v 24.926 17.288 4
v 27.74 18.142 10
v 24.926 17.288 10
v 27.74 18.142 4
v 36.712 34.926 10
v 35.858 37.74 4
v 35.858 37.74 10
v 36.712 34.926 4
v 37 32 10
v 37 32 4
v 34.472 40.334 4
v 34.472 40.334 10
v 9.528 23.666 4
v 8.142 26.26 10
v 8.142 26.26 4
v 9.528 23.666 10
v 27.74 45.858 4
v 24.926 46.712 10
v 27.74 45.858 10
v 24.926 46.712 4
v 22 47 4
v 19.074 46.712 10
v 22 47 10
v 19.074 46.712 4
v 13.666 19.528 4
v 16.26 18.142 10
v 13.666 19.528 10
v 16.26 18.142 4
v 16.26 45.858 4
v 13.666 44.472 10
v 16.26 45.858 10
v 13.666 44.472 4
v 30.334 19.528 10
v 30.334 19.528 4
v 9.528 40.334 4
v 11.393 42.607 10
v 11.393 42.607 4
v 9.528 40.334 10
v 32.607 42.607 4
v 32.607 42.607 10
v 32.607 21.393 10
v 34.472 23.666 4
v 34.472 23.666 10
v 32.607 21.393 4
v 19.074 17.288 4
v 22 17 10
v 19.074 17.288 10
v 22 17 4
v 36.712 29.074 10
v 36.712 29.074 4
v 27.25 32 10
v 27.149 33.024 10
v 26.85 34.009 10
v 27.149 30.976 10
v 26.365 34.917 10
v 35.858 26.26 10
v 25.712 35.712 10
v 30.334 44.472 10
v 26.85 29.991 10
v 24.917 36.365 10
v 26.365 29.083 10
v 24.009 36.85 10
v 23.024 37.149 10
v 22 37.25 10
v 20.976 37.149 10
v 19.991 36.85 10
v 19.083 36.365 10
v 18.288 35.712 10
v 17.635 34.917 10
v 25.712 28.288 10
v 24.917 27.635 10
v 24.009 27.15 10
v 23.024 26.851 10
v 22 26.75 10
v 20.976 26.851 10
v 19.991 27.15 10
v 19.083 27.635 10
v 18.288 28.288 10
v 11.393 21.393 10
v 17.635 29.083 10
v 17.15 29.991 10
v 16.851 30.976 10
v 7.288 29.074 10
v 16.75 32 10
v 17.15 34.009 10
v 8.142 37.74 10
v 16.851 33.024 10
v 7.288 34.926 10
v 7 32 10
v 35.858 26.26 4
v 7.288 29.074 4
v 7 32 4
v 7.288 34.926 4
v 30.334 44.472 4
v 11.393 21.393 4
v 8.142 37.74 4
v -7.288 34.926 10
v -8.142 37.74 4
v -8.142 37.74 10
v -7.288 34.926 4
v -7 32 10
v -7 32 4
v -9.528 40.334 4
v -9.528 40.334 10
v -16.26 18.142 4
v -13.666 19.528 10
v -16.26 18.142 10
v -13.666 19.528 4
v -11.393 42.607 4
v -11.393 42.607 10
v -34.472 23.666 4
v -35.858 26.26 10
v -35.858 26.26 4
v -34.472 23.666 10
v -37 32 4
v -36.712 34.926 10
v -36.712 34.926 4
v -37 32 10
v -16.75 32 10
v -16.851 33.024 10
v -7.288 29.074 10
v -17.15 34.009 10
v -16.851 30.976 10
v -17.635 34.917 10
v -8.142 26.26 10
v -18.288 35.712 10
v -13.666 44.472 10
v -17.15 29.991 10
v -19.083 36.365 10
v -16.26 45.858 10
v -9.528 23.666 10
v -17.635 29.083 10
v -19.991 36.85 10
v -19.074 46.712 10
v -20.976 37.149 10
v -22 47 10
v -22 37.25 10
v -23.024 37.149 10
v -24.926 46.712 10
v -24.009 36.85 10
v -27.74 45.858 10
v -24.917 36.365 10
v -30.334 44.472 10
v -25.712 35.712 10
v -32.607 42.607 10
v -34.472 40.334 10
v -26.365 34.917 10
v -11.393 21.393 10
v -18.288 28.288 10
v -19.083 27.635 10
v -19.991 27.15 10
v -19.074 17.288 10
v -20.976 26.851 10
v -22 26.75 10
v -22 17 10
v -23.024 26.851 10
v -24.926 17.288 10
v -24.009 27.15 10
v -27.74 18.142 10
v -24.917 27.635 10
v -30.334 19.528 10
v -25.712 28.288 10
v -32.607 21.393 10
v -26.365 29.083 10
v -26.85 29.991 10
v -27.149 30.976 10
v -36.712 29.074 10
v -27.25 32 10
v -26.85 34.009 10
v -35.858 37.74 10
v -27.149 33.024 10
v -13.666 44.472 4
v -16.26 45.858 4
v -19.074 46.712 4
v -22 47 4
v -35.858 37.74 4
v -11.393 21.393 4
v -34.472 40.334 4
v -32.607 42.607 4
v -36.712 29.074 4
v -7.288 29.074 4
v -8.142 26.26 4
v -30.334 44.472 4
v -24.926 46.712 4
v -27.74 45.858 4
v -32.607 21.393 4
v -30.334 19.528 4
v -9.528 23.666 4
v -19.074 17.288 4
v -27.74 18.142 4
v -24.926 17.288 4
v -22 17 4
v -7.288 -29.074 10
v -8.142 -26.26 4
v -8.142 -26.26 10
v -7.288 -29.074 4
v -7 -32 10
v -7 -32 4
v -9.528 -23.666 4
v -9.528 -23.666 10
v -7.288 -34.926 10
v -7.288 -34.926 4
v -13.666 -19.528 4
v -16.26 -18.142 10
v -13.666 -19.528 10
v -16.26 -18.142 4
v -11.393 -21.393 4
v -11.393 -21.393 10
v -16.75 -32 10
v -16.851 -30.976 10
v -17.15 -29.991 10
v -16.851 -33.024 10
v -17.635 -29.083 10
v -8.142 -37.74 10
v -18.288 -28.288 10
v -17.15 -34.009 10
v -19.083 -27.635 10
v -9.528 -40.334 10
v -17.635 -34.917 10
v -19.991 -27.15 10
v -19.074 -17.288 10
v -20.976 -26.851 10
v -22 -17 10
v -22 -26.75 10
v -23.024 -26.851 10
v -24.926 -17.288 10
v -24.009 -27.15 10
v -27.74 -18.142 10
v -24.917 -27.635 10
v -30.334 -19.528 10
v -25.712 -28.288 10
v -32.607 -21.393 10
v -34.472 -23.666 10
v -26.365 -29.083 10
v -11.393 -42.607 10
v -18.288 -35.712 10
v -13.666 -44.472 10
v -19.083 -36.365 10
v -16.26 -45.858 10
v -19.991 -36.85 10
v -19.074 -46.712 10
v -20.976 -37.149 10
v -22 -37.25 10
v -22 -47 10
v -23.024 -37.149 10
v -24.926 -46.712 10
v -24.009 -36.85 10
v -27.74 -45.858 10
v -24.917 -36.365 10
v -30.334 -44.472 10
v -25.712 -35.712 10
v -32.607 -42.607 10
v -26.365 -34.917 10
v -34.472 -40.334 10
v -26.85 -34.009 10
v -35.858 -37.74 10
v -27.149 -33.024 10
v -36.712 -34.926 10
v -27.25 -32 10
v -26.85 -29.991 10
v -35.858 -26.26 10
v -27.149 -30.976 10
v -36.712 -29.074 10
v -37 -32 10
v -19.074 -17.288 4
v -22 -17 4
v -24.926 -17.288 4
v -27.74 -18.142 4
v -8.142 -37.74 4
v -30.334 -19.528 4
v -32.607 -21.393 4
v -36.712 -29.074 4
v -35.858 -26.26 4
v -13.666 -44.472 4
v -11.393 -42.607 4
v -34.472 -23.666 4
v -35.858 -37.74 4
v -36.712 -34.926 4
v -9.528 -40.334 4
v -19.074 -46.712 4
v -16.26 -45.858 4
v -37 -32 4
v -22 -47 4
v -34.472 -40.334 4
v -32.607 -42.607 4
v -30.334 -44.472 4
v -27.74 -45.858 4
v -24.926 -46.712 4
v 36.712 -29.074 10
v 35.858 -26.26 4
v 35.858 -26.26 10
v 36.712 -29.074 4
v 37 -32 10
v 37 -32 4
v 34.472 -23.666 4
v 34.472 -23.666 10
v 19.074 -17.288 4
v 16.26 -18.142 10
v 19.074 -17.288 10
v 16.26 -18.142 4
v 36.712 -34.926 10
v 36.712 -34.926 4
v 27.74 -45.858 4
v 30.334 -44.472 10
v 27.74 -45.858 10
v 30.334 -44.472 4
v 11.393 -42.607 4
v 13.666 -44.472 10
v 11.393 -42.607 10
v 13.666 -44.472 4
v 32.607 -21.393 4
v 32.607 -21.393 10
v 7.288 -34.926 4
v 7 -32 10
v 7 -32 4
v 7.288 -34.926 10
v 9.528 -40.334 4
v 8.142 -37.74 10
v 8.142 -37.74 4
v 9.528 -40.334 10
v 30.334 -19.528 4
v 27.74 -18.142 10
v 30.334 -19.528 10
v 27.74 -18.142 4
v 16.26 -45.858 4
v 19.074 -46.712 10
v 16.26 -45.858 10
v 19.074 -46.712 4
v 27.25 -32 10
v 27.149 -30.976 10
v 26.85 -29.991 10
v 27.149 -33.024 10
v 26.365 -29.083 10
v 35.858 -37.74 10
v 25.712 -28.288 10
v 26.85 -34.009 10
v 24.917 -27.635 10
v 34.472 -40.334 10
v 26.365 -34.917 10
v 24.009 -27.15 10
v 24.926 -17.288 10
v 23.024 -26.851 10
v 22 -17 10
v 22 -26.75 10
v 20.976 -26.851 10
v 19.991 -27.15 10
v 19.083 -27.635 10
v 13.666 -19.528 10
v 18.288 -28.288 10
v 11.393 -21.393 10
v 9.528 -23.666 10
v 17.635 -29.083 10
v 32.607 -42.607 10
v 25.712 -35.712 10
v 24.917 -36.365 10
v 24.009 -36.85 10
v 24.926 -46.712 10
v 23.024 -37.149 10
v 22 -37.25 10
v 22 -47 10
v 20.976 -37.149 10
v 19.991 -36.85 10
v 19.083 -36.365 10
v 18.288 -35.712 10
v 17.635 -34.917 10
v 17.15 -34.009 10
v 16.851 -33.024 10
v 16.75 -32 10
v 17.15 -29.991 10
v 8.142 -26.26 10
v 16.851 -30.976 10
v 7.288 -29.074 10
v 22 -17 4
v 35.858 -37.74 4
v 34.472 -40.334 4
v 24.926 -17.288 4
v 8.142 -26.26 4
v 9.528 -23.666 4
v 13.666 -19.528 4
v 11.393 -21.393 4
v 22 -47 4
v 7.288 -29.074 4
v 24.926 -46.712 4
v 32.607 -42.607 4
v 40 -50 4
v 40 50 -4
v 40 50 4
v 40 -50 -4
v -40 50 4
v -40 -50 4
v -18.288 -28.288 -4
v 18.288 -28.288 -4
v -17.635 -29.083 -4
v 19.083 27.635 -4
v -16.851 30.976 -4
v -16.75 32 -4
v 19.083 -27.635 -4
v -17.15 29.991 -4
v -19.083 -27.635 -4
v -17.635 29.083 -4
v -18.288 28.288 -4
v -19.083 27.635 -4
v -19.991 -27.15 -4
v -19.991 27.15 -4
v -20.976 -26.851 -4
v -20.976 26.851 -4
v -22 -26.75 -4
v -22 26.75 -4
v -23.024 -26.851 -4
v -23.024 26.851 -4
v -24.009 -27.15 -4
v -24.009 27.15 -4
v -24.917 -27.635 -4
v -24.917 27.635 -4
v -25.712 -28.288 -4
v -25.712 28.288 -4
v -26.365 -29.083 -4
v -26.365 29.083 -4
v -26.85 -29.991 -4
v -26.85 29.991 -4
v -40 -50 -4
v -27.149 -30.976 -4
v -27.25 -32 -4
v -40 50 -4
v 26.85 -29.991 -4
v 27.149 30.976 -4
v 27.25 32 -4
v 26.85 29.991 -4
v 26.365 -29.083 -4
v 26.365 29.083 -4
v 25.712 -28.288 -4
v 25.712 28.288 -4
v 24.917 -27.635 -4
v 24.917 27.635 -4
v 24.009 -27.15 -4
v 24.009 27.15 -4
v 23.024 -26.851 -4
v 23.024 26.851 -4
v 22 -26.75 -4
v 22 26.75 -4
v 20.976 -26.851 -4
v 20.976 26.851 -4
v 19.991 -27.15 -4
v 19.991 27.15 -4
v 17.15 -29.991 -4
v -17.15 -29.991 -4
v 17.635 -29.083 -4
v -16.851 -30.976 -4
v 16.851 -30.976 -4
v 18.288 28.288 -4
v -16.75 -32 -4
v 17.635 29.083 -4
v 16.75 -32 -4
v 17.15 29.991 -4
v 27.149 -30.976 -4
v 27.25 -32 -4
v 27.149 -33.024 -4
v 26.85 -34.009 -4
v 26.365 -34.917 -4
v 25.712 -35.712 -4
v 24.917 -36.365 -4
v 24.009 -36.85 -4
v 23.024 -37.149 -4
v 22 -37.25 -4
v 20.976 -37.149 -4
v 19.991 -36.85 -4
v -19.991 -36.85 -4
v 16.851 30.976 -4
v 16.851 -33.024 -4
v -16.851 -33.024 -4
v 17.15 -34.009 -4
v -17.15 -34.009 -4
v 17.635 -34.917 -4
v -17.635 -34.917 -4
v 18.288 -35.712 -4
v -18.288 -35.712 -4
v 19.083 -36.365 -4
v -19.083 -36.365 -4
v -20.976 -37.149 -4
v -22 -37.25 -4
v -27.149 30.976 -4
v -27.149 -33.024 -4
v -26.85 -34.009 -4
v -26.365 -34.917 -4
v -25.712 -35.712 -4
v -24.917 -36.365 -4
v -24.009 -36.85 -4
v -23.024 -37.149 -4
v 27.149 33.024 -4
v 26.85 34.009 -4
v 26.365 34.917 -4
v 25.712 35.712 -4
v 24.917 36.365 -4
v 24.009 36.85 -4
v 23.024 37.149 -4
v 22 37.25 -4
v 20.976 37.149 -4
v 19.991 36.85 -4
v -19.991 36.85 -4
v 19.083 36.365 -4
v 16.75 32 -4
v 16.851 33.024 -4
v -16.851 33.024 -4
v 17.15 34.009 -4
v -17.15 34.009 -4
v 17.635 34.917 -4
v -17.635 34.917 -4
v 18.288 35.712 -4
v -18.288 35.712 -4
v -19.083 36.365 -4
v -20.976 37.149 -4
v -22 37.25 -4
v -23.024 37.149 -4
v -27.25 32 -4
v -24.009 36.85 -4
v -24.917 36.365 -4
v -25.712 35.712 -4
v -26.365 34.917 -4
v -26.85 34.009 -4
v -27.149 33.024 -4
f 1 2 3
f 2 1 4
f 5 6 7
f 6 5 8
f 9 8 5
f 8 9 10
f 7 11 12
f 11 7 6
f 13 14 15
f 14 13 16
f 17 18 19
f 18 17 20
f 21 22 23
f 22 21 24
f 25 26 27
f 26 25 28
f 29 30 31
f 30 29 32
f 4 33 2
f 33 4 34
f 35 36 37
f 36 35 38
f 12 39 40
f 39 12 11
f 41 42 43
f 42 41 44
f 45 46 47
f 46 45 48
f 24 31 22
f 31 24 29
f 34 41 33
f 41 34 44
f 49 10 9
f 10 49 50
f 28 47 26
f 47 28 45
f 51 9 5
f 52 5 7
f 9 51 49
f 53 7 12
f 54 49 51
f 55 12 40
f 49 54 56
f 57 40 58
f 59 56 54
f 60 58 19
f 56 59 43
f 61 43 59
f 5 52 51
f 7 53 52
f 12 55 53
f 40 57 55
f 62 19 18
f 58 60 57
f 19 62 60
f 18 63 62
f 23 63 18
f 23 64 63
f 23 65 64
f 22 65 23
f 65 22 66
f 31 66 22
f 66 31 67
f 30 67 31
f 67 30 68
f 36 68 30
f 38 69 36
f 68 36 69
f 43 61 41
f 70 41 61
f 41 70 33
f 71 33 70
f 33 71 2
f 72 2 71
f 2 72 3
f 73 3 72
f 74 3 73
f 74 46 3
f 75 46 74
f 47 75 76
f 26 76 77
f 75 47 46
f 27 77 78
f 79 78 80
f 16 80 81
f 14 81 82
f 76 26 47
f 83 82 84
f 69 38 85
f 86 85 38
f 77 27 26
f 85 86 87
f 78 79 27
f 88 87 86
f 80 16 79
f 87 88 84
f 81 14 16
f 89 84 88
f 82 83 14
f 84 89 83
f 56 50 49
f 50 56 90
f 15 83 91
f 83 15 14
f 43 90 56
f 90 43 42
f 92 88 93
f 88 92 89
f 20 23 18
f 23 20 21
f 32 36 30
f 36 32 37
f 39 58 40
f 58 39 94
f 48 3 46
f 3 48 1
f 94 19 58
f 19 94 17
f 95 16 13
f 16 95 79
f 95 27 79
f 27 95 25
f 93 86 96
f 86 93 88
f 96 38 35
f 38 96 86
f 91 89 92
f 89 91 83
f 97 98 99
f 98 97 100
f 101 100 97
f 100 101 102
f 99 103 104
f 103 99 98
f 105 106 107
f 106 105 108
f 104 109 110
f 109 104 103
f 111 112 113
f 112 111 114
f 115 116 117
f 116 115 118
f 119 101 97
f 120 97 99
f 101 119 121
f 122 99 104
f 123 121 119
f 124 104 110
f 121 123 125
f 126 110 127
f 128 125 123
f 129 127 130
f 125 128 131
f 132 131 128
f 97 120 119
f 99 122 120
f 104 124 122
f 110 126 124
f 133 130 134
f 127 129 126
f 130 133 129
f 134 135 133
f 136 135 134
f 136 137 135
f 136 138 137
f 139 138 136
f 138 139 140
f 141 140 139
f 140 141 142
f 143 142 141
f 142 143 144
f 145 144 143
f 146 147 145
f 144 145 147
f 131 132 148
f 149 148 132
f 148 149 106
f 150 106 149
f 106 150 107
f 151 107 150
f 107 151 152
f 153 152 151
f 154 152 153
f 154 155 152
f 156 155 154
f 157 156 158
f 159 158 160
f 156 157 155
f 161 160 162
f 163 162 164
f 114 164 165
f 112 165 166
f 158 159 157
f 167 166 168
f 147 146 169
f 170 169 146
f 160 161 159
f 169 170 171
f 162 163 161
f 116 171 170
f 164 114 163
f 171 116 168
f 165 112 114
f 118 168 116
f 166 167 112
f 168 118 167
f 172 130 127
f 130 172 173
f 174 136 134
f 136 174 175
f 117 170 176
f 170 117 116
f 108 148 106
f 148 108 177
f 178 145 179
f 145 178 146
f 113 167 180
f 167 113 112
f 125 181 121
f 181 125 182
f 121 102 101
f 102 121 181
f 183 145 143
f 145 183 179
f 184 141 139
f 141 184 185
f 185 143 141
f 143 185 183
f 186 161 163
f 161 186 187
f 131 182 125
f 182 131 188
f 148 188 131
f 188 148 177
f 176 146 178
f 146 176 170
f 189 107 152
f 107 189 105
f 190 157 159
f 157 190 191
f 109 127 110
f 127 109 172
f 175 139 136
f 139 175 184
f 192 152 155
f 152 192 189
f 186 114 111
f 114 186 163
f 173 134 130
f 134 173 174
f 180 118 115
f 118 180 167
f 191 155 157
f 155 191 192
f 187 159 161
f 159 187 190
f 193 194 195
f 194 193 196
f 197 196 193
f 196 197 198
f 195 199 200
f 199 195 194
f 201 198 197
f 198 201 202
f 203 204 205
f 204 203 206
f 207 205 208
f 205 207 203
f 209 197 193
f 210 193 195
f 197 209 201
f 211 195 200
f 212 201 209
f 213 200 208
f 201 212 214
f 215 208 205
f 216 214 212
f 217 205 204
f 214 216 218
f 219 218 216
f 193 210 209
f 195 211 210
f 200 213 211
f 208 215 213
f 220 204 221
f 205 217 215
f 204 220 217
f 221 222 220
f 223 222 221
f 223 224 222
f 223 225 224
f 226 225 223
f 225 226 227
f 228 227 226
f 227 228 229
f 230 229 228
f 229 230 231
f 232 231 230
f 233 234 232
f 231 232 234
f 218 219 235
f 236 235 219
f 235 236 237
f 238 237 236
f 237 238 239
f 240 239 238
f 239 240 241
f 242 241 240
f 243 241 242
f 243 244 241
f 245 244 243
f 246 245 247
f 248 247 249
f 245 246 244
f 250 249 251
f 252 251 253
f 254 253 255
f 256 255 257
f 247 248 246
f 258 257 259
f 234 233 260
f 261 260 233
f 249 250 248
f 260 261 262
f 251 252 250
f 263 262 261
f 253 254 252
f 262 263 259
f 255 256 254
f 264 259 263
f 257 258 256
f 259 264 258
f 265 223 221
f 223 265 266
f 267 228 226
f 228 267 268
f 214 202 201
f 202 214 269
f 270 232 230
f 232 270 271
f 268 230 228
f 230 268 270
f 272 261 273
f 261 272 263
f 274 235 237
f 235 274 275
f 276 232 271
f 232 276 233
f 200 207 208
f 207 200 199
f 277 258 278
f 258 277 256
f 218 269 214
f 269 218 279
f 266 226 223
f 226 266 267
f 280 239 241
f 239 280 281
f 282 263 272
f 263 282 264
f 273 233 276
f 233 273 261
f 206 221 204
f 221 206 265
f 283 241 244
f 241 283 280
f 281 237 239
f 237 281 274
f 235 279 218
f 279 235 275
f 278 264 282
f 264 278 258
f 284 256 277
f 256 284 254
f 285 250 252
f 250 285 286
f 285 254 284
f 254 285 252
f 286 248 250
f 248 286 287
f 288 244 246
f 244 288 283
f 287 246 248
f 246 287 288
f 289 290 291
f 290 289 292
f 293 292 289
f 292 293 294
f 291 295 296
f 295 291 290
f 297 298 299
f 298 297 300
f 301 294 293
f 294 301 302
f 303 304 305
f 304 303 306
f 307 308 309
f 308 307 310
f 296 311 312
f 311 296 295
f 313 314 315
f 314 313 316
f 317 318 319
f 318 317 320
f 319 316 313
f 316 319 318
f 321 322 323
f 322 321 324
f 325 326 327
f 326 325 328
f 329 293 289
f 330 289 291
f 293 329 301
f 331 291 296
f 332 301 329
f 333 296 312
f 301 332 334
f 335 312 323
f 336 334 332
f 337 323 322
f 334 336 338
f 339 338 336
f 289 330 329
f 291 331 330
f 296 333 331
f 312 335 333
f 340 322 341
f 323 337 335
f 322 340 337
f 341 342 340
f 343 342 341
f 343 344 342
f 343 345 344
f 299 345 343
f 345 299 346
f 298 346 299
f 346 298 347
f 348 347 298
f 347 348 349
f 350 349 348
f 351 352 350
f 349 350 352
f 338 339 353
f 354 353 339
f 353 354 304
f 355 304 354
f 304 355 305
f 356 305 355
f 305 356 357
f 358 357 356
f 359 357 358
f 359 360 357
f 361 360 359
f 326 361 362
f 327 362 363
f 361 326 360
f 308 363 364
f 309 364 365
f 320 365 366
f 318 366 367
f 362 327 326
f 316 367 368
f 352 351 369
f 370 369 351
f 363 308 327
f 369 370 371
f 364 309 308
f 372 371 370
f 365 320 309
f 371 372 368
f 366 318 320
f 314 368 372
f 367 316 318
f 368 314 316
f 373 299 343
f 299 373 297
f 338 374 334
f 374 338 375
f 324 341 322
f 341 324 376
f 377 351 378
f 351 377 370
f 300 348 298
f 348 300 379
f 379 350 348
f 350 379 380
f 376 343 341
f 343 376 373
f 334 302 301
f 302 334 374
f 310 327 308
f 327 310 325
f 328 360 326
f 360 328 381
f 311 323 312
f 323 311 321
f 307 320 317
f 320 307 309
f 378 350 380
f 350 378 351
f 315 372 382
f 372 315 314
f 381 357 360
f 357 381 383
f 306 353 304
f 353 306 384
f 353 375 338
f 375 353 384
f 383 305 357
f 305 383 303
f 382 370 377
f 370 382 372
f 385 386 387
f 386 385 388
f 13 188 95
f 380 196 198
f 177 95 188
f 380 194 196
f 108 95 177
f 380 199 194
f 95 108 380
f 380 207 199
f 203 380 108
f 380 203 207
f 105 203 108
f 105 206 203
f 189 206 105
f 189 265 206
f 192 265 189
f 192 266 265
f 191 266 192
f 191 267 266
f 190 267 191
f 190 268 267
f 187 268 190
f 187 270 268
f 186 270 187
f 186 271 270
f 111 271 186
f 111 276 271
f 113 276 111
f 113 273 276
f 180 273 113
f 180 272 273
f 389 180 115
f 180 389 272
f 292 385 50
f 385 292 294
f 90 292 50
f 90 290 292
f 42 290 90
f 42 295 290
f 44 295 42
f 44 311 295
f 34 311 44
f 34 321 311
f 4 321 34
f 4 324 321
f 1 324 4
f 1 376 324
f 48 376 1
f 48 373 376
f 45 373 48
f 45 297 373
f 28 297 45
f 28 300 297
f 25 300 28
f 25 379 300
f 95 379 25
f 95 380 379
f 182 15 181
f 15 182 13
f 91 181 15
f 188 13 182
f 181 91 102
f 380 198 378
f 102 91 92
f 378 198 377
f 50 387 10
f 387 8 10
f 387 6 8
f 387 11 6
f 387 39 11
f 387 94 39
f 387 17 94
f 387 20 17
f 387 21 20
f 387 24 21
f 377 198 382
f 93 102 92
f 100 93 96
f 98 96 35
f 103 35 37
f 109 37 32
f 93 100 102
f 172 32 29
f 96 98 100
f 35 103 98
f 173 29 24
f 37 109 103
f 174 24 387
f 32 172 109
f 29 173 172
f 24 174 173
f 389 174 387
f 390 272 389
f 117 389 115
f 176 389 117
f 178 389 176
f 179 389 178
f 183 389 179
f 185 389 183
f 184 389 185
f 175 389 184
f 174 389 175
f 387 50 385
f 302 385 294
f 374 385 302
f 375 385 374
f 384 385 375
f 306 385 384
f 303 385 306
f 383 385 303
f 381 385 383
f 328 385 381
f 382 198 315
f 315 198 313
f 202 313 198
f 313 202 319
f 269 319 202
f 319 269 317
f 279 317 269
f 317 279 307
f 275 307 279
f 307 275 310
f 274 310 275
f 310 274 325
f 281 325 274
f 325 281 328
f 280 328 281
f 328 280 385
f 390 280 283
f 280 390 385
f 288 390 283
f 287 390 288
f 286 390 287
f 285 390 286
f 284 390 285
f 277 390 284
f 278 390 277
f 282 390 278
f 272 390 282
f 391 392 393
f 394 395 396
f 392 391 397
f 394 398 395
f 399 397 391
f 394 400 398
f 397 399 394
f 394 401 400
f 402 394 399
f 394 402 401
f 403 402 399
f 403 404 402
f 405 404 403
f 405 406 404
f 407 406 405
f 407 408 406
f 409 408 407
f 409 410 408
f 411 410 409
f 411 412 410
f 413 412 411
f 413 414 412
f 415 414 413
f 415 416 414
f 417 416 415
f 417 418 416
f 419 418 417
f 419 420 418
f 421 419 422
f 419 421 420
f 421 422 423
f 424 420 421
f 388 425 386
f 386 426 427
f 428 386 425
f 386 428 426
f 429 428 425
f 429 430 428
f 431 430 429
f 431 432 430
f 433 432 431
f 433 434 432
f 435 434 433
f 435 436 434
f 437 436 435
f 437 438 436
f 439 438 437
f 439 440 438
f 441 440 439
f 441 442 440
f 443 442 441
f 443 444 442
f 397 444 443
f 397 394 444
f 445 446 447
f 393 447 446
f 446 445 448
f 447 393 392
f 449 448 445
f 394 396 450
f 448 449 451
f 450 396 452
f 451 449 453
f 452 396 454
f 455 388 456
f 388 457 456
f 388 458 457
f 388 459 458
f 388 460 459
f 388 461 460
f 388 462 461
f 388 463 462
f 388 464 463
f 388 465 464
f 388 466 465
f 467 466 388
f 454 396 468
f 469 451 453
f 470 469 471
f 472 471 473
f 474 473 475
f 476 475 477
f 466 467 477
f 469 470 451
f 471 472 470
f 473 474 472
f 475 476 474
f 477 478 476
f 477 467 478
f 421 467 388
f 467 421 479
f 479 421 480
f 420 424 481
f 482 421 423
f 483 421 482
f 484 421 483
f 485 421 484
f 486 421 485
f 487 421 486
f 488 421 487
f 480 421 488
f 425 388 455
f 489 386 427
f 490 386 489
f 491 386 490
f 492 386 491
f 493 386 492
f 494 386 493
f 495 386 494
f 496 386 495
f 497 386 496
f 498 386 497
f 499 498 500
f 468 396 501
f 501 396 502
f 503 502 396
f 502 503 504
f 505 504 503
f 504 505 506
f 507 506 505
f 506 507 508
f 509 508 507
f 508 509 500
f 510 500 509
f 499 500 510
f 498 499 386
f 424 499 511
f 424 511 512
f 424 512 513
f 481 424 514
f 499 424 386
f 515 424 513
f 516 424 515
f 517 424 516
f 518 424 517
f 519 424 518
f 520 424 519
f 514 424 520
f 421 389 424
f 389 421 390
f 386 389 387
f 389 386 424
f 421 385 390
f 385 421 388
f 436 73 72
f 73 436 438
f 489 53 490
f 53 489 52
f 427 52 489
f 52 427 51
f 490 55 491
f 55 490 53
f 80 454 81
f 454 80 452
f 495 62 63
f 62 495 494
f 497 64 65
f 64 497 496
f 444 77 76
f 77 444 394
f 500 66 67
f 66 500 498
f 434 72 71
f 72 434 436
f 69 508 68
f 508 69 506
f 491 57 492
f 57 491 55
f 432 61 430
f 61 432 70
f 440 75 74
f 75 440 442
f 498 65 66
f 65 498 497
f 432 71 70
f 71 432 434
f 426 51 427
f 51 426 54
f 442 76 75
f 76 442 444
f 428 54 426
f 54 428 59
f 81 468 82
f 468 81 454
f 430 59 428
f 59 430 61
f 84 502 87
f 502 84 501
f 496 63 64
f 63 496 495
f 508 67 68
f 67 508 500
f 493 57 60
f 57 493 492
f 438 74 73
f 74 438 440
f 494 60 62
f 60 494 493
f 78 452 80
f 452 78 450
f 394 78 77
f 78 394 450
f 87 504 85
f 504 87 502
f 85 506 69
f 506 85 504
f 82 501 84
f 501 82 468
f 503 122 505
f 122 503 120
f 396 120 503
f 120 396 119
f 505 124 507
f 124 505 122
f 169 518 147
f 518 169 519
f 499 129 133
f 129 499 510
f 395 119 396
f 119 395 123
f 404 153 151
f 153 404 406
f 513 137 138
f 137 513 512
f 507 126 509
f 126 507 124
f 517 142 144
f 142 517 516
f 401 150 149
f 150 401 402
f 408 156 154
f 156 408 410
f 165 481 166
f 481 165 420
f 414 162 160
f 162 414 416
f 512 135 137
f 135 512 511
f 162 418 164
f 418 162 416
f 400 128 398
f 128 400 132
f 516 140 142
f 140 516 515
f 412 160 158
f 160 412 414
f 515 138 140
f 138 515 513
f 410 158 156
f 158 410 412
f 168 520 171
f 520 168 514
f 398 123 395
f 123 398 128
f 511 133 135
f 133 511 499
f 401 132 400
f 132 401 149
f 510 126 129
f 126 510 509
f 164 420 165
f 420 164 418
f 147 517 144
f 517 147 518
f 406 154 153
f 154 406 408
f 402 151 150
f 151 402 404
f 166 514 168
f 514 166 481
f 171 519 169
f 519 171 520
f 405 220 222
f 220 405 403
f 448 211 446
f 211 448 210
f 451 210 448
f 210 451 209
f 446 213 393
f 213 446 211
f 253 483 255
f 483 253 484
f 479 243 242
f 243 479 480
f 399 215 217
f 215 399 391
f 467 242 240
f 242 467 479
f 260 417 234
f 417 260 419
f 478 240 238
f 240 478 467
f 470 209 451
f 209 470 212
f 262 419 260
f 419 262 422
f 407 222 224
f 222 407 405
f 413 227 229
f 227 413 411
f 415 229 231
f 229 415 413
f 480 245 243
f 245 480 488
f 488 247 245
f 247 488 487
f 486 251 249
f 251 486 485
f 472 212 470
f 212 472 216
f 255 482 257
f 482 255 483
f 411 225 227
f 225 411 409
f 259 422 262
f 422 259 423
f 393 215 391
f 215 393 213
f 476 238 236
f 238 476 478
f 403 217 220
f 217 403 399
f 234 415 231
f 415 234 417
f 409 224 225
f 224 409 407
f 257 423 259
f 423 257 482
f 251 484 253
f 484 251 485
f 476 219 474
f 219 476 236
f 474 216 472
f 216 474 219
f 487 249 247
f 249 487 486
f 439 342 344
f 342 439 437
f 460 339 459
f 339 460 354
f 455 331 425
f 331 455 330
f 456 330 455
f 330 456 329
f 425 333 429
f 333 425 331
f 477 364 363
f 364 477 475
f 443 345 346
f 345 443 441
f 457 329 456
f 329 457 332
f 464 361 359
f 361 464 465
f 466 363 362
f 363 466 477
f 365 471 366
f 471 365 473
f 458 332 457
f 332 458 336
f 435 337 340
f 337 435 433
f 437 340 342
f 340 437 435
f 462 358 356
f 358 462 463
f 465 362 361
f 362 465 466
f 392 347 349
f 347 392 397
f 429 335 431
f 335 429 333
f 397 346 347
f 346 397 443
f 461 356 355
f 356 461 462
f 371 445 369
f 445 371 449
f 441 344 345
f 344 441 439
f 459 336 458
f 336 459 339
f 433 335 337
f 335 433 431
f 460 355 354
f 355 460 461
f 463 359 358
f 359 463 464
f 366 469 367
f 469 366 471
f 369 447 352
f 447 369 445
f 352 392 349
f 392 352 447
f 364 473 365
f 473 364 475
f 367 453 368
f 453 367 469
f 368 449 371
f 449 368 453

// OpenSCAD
$fn = 32;

// ----------------------------------------------------------------------
// Anchor pads 80 x 100 x 14
// four corner bosses with anchor holes
// ----------------------------------------------------------------------

// --- parameters (mm) ---
plate = [80, 100, 8];  // base plate size (x, y, z)
pads = 4;              // boss count, one per corner
edge = 18;             // boss centre offset from the plate edge
boss_d = 30;           // boss diameter
boss_h = 6;            // boss height above the base plate
hole_d = 10.5;         // hole diameter

// --- derived feature positions (mm) ---
height = plate[2] + boss_h;      // = 14   overall height of the part
corner_x = plate[0] / 2 - edge;  // = 22   boss centre X
corner_y = plate[1] / 2 - edge;  // = 32   boss centre Y
feature_centers = [
  [corner_x, corner_y],
  [-corner_x, corner_y],
  [-corner_x, -corner_y],
  [corner_x, -corner_y]
];   // boss centres, anchor holes are drilled there

// base plate, four bosses standing on it, anchor holes all the way through
difference() {
  union() {
    cube(plate, center = true);
    for (centre = feature_centers)
      translate([centre[0], centre[1], plate[2] / 2 - 1])
        cylinder(d = boss_d, h = boss_h + 1);
  }
  for (centre = feature_centers)
    translate([centre[0], centre[1], -height])
      cylinder(d = hole_d, h = 2 * height + 2);  // through boss and plate
}
